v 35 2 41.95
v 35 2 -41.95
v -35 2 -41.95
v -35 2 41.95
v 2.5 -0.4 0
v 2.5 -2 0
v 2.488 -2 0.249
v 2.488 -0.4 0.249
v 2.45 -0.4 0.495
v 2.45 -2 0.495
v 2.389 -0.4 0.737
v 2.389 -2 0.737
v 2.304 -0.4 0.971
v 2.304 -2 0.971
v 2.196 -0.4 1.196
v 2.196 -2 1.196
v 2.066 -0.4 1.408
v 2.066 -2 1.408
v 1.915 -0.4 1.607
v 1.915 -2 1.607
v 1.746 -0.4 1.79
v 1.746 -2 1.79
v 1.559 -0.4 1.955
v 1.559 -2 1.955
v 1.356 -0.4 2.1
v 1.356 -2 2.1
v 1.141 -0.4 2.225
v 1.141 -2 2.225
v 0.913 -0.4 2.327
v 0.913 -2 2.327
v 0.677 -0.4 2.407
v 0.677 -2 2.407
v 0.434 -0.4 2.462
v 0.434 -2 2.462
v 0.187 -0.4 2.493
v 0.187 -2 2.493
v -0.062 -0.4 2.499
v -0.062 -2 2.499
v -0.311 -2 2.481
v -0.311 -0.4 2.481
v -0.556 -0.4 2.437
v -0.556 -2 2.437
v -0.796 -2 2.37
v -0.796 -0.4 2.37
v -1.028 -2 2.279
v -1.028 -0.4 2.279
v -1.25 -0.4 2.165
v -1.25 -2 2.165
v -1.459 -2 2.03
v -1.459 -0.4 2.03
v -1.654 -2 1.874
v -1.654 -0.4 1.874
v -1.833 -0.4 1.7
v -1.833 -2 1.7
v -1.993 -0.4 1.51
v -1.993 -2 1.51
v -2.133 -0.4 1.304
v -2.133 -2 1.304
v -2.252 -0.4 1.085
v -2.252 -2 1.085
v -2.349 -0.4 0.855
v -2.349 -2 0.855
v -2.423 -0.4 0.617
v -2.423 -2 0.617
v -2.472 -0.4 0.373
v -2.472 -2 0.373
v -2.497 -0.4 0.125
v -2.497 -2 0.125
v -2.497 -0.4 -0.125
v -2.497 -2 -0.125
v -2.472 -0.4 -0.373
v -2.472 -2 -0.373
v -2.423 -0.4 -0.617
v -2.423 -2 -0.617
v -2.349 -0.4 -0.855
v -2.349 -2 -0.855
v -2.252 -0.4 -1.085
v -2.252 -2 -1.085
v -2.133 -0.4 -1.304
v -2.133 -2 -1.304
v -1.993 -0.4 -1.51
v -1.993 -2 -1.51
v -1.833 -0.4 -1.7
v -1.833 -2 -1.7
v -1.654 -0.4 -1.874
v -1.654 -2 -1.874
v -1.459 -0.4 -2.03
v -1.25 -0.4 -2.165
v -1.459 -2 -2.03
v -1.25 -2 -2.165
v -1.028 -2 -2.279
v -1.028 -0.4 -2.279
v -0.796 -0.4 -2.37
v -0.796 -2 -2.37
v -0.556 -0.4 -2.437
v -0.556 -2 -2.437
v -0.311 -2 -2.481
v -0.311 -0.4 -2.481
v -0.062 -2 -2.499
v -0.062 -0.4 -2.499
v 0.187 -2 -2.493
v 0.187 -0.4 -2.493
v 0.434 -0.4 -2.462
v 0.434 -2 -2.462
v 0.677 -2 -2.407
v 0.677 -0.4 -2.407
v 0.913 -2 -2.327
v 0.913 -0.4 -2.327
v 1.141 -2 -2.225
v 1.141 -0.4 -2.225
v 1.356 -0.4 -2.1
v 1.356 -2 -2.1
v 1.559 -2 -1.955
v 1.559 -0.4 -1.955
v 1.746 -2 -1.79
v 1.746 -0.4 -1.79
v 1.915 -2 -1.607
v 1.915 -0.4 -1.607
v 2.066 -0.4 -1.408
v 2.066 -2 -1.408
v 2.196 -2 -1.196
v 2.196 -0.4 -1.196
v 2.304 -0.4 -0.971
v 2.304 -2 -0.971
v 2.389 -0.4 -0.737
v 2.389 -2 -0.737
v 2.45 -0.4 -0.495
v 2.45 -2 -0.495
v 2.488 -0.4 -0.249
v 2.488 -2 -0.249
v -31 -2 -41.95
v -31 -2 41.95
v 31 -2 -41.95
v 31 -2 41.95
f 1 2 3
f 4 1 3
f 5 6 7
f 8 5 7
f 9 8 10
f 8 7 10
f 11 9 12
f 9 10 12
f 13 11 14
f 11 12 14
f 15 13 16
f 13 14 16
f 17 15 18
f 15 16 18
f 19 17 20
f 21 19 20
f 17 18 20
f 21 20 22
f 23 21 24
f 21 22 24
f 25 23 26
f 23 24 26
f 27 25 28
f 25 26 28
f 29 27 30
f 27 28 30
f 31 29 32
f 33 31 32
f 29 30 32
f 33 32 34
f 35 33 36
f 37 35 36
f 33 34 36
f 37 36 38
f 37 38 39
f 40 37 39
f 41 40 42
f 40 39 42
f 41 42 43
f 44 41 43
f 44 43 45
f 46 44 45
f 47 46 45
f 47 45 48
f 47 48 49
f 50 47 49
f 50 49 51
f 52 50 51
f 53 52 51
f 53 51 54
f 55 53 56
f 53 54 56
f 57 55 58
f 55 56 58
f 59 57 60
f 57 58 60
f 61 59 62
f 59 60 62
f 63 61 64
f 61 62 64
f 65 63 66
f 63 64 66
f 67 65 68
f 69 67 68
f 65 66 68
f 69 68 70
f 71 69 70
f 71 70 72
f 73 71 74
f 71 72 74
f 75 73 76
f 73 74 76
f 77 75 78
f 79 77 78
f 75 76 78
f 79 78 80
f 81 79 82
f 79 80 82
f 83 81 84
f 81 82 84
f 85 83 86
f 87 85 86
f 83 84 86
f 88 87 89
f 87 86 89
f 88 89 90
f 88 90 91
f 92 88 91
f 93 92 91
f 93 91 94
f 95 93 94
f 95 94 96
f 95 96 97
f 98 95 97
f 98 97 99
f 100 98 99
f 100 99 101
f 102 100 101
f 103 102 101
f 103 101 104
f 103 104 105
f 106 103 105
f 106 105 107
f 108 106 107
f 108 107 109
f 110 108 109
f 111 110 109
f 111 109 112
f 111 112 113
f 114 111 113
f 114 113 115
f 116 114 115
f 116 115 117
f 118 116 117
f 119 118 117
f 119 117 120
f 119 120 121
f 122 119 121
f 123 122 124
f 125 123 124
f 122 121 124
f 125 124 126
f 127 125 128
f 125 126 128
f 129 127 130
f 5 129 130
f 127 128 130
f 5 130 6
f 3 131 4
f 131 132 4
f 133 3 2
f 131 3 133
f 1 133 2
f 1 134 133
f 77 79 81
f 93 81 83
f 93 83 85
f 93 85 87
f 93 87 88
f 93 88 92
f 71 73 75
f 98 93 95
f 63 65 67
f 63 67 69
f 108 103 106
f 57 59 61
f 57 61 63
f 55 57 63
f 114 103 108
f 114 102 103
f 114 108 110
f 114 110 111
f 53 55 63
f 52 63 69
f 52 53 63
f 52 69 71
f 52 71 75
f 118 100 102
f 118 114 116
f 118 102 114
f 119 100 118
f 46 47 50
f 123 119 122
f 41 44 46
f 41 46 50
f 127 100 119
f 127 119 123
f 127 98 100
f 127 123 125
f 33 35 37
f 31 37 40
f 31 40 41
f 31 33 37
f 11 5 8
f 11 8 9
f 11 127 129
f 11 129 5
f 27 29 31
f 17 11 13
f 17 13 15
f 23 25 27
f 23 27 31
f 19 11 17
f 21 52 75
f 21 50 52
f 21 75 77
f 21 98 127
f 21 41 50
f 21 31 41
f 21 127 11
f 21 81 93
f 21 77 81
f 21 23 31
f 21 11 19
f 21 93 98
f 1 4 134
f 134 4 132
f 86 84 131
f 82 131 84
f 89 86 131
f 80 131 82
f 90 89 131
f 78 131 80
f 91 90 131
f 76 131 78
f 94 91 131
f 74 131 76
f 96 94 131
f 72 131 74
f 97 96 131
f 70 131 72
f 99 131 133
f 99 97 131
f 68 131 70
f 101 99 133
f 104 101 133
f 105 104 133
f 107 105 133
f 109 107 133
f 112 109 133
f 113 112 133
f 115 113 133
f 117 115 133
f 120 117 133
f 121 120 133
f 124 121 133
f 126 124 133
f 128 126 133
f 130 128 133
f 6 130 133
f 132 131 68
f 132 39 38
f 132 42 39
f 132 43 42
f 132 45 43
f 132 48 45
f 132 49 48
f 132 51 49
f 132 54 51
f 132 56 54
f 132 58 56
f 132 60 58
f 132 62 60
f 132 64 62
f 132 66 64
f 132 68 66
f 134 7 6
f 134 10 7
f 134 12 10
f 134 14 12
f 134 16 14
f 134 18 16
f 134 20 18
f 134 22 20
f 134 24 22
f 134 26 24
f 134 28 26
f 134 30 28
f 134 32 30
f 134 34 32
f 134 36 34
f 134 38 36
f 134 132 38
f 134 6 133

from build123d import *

# Parameters (mm, degrees)
PAD_DEPTH    = 41.95
SKETCH001_R  = 2.5
POCKET_DEPTH = 1.6


with BuildPart() as part:
    # Sketch (on XY_Plane of Origin) → Pad (new body, symmetric)
    with BuildSketch(Plane.XY):
        Polygon((0, 2), (0, -2), (-31, -2), (-35, 2), align=None)
    extrude(amount=PAD_DEPTH, both=True)

    # Mirrored: part across YZ


with BuildPart() as part_1:
    add(part.part)
    add(part.part.mirror(Plane.YZ))

    # Sketch001 (on Face2 of Mirrored) → Pocket (cut)
    with BuildSketch(Plane.XZ.offset(2)):
        Circle(SKETCH001_R)
    extrude(amount=-POCKET_DEPTH, mode=Mode.SUBTRACT)


solid = part_1.part
